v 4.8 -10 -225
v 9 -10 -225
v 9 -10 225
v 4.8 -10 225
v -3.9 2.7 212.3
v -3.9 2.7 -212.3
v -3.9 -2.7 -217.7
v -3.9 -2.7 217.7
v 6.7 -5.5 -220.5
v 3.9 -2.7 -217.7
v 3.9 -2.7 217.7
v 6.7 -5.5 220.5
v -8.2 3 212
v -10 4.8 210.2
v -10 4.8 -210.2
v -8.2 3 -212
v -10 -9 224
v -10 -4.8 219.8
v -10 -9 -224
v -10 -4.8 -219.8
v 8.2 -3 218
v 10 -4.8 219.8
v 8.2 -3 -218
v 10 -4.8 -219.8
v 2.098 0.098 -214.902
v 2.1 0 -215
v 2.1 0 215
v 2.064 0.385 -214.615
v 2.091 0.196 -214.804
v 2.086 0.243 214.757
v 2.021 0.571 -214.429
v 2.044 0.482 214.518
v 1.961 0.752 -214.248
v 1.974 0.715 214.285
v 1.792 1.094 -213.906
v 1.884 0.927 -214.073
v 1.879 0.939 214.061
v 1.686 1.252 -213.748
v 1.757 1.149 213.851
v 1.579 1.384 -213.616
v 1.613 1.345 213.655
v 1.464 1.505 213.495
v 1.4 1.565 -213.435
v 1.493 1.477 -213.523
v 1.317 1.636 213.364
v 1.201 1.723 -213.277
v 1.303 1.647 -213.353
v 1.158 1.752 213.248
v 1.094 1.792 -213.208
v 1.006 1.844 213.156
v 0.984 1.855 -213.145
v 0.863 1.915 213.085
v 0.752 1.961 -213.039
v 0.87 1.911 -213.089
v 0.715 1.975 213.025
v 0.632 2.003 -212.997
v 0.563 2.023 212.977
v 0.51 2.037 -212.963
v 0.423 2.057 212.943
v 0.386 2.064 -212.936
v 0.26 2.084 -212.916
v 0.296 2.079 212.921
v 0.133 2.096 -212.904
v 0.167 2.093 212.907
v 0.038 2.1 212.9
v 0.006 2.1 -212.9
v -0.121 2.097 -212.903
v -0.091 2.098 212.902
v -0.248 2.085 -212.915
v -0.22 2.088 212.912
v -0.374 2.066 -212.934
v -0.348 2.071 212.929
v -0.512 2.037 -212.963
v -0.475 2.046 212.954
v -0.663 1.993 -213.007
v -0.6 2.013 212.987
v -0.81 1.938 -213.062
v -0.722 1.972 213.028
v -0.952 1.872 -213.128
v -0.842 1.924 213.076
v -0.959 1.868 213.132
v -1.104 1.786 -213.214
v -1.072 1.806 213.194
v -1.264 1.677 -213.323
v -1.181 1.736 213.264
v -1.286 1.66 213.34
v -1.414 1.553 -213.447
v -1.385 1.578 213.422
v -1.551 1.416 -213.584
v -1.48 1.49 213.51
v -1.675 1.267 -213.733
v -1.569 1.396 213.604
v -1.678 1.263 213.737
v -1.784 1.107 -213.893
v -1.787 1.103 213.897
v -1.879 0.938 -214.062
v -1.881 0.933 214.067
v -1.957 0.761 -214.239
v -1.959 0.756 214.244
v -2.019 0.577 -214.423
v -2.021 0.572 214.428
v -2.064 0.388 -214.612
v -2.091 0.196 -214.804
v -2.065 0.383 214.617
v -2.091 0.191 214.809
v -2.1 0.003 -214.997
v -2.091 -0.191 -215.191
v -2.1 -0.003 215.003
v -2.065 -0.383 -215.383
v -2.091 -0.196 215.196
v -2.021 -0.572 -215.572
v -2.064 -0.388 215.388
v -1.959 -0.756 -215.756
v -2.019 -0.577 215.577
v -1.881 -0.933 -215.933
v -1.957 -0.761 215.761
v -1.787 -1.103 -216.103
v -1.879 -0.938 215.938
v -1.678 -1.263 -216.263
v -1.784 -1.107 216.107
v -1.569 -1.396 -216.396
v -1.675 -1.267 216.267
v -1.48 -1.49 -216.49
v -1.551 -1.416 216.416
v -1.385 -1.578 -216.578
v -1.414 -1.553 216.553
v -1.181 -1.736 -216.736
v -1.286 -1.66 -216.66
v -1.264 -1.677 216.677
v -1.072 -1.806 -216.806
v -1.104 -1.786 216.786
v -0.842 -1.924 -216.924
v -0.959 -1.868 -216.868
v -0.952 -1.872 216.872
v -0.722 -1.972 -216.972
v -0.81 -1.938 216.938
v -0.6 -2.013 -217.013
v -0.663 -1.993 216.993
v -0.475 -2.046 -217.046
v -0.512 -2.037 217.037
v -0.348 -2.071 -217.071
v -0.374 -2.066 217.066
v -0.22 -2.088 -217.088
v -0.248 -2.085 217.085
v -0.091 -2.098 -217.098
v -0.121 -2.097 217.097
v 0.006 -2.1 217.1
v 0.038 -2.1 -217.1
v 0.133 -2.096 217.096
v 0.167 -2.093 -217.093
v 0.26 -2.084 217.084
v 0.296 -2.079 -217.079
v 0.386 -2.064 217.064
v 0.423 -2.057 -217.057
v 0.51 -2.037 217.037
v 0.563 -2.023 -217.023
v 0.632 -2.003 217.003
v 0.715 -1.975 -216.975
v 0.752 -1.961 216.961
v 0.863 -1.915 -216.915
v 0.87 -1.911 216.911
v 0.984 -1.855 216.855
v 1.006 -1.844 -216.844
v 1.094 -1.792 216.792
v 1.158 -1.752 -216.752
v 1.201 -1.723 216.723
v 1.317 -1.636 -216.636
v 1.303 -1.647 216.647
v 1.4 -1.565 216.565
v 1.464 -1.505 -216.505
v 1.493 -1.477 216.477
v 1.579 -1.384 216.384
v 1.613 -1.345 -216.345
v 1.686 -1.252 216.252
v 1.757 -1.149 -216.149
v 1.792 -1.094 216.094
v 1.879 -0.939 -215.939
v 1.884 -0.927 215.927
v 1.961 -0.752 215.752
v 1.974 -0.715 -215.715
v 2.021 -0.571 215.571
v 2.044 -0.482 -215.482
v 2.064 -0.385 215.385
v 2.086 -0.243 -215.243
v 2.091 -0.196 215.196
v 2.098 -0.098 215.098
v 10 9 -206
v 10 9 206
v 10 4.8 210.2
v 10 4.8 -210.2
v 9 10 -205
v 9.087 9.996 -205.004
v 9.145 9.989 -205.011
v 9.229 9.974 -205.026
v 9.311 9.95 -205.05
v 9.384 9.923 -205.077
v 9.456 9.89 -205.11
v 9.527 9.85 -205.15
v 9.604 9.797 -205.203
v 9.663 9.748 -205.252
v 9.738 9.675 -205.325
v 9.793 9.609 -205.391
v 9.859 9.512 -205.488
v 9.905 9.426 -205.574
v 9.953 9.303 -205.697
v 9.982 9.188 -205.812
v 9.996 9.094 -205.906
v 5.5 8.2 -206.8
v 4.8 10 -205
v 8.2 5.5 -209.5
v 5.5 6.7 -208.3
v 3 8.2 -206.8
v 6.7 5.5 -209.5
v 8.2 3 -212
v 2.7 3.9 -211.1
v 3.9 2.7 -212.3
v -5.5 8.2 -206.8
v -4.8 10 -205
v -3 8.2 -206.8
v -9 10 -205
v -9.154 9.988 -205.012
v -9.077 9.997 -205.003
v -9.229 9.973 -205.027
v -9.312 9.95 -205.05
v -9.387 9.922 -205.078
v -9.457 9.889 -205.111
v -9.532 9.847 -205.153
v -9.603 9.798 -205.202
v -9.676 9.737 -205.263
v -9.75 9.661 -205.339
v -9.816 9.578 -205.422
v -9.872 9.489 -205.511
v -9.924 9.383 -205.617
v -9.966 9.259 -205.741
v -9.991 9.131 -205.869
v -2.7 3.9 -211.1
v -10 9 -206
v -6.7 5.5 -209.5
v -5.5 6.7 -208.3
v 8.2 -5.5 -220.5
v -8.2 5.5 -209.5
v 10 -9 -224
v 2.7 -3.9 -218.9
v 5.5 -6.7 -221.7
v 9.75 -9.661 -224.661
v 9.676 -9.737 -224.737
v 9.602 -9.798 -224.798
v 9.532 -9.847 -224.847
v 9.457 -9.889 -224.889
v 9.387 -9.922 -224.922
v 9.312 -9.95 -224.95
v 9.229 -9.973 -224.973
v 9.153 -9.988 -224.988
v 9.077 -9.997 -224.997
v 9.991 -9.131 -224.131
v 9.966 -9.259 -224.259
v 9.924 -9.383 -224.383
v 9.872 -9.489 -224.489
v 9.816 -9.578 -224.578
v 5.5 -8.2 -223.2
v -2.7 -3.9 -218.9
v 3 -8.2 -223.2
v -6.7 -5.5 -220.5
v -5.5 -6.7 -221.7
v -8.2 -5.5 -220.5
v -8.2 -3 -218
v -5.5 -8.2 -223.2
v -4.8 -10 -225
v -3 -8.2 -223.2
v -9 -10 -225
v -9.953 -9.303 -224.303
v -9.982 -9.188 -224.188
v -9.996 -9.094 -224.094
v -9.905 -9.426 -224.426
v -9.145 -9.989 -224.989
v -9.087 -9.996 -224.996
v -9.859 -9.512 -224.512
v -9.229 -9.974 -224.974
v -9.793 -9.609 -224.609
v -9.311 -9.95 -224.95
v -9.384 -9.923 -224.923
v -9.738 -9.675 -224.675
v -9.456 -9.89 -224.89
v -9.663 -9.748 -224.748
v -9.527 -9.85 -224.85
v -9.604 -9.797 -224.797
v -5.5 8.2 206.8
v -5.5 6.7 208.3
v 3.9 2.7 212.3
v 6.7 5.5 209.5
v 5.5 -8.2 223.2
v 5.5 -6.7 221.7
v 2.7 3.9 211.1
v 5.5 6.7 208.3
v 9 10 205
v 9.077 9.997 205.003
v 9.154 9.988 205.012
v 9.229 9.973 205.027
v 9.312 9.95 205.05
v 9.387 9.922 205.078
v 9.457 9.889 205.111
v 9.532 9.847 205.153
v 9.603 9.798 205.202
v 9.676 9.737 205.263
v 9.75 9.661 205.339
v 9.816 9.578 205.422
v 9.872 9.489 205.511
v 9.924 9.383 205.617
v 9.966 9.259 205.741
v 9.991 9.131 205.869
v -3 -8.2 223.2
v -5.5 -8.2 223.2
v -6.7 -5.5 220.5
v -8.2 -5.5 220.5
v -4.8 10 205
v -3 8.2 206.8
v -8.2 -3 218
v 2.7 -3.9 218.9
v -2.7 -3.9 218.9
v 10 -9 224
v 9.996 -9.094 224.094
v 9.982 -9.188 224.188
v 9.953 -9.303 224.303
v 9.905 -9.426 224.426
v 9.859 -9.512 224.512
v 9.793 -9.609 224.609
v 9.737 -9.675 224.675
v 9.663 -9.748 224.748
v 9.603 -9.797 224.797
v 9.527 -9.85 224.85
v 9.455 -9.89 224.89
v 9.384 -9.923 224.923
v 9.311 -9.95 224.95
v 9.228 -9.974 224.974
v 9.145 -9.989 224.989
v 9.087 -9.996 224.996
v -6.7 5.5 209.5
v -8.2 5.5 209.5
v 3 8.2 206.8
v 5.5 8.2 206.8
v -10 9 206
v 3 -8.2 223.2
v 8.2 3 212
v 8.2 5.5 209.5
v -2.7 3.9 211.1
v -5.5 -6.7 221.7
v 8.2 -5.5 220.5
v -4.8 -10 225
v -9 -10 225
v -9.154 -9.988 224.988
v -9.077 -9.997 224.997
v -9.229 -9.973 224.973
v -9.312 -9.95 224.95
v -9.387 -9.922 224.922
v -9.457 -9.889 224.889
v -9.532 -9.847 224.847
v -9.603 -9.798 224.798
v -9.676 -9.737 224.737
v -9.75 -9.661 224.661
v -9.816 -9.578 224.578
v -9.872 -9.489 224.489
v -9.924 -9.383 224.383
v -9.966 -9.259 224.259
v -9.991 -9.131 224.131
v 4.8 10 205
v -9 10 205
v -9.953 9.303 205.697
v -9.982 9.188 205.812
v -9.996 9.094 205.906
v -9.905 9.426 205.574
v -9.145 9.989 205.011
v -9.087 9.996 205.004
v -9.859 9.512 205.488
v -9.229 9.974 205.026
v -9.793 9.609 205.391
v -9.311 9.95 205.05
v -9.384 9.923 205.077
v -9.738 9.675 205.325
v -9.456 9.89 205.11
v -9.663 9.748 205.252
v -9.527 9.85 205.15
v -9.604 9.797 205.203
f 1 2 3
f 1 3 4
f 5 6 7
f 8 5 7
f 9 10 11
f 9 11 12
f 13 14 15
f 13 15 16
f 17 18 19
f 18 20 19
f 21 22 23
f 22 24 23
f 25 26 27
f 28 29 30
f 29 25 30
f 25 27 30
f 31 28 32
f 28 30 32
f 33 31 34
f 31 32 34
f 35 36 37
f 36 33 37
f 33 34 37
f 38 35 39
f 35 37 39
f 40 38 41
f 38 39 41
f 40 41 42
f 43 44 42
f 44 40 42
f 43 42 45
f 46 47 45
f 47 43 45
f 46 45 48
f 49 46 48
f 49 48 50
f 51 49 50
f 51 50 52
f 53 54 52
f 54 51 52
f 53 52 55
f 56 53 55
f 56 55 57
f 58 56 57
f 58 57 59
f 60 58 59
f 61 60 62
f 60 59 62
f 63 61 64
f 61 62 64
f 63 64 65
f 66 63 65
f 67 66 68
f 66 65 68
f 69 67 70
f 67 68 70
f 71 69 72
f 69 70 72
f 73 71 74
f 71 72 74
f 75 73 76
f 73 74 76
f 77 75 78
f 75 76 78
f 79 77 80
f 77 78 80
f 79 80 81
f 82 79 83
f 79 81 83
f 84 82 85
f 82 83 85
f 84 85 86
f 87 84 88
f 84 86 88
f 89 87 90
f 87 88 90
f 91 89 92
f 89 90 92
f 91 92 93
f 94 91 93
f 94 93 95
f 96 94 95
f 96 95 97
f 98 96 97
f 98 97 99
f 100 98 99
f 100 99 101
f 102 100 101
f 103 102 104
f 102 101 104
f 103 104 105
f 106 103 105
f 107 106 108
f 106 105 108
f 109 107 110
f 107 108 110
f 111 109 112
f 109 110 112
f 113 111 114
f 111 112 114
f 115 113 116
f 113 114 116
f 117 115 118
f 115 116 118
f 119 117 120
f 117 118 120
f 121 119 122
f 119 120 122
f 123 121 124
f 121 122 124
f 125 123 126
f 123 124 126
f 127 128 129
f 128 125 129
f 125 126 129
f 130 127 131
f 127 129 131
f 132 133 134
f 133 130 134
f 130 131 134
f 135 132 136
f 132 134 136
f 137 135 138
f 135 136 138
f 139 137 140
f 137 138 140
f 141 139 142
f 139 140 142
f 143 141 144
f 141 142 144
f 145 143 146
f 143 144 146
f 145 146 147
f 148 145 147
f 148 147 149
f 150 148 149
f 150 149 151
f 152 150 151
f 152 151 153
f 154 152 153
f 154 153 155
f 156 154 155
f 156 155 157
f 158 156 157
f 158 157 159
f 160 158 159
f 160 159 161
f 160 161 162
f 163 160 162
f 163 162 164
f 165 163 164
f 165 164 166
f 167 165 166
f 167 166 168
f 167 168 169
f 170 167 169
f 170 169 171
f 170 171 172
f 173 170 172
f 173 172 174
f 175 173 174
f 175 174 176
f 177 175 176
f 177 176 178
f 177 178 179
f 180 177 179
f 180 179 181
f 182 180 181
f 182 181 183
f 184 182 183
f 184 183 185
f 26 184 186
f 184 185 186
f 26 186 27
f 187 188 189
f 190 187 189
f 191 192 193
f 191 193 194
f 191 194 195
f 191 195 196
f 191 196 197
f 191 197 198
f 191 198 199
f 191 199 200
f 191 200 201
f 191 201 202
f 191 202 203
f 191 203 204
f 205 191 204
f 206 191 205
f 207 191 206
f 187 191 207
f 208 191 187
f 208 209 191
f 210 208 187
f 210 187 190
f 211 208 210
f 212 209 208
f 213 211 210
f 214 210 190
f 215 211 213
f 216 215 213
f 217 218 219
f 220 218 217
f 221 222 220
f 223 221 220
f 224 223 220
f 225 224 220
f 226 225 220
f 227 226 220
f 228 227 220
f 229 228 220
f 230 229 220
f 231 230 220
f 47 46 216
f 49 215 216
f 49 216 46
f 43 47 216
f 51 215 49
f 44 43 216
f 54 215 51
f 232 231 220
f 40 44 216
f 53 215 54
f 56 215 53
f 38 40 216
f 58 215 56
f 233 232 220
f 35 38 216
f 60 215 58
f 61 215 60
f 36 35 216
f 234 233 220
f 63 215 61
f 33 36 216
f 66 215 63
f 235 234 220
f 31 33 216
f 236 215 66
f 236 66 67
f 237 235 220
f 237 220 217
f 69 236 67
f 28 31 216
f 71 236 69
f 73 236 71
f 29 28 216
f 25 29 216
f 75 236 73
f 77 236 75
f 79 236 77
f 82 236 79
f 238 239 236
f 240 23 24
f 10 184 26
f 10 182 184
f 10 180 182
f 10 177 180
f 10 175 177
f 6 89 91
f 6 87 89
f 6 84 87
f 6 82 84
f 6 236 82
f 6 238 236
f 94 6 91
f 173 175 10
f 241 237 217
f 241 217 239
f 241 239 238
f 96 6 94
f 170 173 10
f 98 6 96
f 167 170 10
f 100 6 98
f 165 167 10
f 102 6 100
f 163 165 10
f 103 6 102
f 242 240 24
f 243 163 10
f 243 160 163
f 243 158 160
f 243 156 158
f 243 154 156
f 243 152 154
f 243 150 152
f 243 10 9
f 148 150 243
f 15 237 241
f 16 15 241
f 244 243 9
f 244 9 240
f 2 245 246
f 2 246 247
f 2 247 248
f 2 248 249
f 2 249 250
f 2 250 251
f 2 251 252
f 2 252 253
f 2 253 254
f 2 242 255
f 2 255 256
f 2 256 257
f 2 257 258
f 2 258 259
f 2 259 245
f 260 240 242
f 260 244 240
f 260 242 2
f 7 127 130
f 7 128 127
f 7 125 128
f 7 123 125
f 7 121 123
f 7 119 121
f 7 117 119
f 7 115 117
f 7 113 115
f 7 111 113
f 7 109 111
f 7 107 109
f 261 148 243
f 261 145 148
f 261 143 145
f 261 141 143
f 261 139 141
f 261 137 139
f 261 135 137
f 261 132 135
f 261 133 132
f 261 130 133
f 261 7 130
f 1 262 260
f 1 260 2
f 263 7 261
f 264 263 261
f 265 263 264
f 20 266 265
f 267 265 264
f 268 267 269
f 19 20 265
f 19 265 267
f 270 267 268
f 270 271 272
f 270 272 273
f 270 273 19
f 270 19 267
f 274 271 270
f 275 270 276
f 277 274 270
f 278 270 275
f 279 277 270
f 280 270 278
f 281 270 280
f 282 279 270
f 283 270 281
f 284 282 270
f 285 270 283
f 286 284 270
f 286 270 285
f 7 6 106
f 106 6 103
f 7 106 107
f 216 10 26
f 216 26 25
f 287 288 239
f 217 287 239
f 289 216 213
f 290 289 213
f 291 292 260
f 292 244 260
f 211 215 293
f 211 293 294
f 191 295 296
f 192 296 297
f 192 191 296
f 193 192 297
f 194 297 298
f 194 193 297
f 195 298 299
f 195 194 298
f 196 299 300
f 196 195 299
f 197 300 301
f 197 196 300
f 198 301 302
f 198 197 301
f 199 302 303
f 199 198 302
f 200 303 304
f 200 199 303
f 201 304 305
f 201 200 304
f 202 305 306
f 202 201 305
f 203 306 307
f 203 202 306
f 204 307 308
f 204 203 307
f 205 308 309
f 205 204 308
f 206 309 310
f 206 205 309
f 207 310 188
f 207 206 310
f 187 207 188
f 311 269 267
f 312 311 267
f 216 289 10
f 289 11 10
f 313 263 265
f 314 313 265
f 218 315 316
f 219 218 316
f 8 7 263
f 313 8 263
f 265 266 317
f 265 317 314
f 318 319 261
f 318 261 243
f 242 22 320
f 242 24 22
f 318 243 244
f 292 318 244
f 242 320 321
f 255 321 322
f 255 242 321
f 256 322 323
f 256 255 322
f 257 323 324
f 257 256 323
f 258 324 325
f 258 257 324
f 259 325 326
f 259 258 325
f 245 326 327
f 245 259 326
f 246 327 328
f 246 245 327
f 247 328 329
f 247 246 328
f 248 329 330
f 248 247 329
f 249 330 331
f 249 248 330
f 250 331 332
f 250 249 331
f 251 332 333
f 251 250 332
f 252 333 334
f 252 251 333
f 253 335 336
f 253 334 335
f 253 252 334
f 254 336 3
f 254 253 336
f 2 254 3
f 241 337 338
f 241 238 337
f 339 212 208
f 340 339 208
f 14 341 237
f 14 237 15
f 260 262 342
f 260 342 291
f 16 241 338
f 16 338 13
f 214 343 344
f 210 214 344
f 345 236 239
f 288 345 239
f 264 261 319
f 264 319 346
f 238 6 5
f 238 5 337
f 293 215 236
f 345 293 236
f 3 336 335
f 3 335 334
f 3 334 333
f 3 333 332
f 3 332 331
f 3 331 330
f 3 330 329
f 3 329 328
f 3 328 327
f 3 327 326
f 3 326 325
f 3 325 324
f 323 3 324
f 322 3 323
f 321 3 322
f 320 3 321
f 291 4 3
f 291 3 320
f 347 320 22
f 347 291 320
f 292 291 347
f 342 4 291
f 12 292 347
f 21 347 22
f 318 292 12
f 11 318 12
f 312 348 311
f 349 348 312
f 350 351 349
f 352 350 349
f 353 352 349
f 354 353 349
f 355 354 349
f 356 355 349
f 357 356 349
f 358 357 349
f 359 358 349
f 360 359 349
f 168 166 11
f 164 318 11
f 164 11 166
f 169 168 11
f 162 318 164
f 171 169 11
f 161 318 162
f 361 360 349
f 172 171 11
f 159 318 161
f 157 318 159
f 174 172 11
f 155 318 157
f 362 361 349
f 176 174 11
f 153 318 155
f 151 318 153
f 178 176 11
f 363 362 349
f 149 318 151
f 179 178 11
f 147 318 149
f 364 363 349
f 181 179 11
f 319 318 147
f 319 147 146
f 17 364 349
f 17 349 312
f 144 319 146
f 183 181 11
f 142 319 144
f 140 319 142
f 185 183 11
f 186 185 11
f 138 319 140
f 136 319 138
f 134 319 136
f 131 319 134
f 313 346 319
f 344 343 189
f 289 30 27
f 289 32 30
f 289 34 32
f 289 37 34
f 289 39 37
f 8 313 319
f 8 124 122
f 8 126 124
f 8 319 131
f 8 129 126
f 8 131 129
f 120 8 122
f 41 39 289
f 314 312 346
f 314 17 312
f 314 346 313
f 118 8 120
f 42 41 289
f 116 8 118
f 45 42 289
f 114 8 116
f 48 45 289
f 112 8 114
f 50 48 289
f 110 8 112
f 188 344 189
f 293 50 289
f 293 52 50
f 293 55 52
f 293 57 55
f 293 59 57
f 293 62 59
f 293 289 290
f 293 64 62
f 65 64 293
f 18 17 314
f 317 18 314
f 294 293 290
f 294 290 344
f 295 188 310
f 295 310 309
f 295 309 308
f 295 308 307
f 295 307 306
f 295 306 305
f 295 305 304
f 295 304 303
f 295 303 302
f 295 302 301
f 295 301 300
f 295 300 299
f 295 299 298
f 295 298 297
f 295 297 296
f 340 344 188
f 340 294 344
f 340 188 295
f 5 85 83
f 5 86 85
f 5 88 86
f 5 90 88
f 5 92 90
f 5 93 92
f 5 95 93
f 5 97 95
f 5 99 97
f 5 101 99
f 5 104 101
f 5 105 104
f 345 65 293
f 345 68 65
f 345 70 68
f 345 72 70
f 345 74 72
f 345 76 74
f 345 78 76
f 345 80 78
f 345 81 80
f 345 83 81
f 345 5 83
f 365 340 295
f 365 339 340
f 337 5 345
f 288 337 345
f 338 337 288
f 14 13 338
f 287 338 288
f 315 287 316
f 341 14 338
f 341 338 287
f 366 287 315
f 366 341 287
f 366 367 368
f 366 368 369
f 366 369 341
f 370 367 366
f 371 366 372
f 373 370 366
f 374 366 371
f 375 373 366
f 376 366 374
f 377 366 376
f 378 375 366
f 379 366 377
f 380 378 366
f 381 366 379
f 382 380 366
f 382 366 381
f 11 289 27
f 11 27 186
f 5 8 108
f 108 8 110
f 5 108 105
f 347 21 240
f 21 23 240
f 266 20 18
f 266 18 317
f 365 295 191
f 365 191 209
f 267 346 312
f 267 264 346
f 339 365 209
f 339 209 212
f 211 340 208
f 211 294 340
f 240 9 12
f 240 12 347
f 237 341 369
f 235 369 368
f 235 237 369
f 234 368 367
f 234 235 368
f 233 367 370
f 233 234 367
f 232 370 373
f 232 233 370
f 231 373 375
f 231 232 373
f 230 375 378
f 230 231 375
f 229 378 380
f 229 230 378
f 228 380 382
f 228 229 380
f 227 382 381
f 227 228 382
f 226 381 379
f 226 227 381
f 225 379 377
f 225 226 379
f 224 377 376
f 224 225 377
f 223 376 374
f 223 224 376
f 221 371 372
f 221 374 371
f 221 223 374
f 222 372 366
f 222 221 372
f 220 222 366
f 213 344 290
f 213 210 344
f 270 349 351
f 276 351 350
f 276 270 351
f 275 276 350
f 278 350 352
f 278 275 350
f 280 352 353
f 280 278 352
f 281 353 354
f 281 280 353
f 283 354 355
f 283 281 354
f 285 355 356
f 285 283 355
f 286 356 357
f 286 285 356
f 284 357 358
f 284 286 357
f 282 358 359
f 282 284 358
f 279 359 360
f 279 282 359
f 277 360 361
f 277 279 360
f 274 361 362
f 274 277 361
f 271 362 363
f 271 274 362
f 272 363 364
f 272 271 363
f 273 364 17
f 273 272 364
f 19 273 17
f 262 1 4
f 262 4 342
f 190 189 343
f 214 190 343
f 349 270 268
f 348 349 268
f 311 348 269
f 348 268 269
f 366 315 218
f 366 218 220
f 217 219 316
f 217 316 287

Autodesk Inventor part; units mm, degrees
ref_plane "YZ Plane" through (0, 0, 0) normal (1, 0, 0) x (0, 1, 0)
sketch "Эскиз1" plane through (0, 0, 0) normal (0, 0, 1) x (1, 0, 0)
  line L0 (-4.8, 10) -> (-3, 8.2)
  line L1 (-4.8, 10) -> (-2.2544, 10) construction
  line L2 (4.8, 10) -> (3, 8.2)
  line L3 (4.8, 10) -> (7.3456, 10) construction
  line L4 (10, 4.8) -> (8.2, 3)
  arc A0 (-9, 10) -> (-10, 9) centre (-9, 9) ccw
  arc A1 (10, 9) -> (9, 10) centre (9, 9) ccw
  arc A2 (-10, -9) -> (-9, -10) centre (-9, -9) ccw
  arc A3 (8.9996, -10) -> (10, -9) centre (9, -9) ccw
  line L5 (0, 3.9) -> (-2.7, 3.9)
  line L6 (0, 3.9) -> (2.7, 3.9)
  line L7 (3, 8.2) -> (5.5, 8.2)
  line L8 (2.7, 3.9) -> (5.5, 6.7)
  line L9 (5.5, 6.7) -> (5.5, 8.2)
  line L10 (3.9, 0) -> (3.9, 2.7)
  line L11 (3.9, 0) -> (3.9, -2.7)
  line L12 (3.9, 2.7) -> (6.7, 5.5)
  line L13 (3.9, 2.7) -> (7.8598, 2.7) construction
  line L14 (9, 10) -> (4.8, 10)
  line L15 (-4.8, 10) -> (-9, 10)
  line L16 (0, -3.9) -> (-2.7, -3.9)
  line L17 (0, -3.9) -> (2.7, -3.9)
  line L18 (-3.9, 0) -> (-3.9, -2.7)
  line L19 (-3.9, 0) -> (-3.9, 2.7)
  line L20 (8.2, 3) -> (8.2, 5.5)
  line L21 (8.2, 5.5) -> (6.7, 5.5)
  line L22 (-10, -4.8) -> (-7.4544, -4.8) construction
  line L23 (-4.8, -10) -> (-3, -8.2)
  line L24 (-4.8, -10) -> (-2.2544, -10) construction
  line L25 (4.7996, -10) -> (2.9996, -8.2)
  line L26 (4.7996, -10) -> (7.3452, -10) construction
  line L27 (10, -4.8) -> (8.2, -3)
  line L28 (8.9996, -10) -> (4.7996, -10)
  line L29 (-9, -10) -> (-4.8, -10)
  line L30 (10, -4.8) -> (10, -9)
  line L31 (10, 9) -> (10, 4.8)
  line L32 (-10, -4.8) -> (-10, -9)
  line L33 (-3, 8.2) -> (-5.5, 8.2)
  line L34 (-2.7, 3.9) -> (-5.5, 6.7)
  line L35 (-2.7, 3.9) -> (1.2598, 3.9) construction
  line L36 (-5.5, 6.7) -> (-5.5, 8.2)
  line L37 (-3.9, 2.7) -> (-6.7, 5.5)
  line L38 (-6.7, 5.5) -> (-8.2, 5.5)
  line L39 (-8.2, -3) -> (-8.2, -5.5)
  line L40 (-3, -8.2) -> (-5.5, -8.2)
  line L41 (2.9996, -8.2) -> (5.5, -8.2)
  line L42 (8.2, -3) -> (8.2, -5.5)
  line L43 (-3.9, -2.7) -> (-6.7, -5.5)
  line L44 (-6.7, -5.5) -> (-8.2, -5.5)
  line L45 (-2.7, -3.9) -> (-5.5, -6.7)
  line L46 (-5.5, -6.7) -> (-5.5, -8.2)
  line L47 (-10, 9) -> (-10, 4.8)
  line L48 (-10, 4.8) -> (-8.2, 3)
  line L49 (-8.2, 5.5) -> (-8.2, 3)
  line L50 (-10, -4.8) -> (-8.2, -3)
  line L51 (2.7, -3.9) -> (5.5, -6.7)
  line L52 (5.5, -6.7) -> (5.5, -8.2)
  line L53 (3.9, -2.7) -> (6.7, -5.5)
  line L54 (6.7, -5.5) -> (8.2, -5.5)
  point P0 (0, 0)
  dimension "d16" = 45
  dimension "d17" = 135
  dimension "d25" = 6
  dimension "d29" = 1
  dimension "d30" = 1
  dimension "d31" = 2.7
  dimension "d32" = 2.7
  dimension "d34" = 2.5
  dimension "d36" = 2.7
  dimension "d37" = 2.7
  dimension "d38" = 3.9
  dimension "d39" = 45
  dimension "d42" = 2.7
  dimension "d43" = 2.7
  dimension "d44" = 3.9
  dimension "d45" = 2.7
  dimension "d46" = 2.7
  dimension "d48" = 10
  dimension "d49" = 10
  dimension "d55" = 4.5
  dimension "d58" = 9
  dimension "d59" = 9
  dimension "d60" = 2.5
  dimension "d61" = 2.8
  dimension "d63" = 1.6971
  dimension "d65" = 45
  dimension "d67" = 135
  dimension "d73" = 10
  dimension "d74" = 10
  dimension "d77" = 18
  dimension "d78" = 18
  dimension "d79" = 135
  dimension "d80" = 135
  dimension "d81" = 4.5
  dimension "d82" = 1.8
  dimension "d83" = 1.8
  dimension "d84" = 1
  dimension "d85" = 1
  dimension "d87" = 4.5
  dimension "d89" = 1.8
  dimension "d91" = 135
  dimension "d92" = 1.6971
  dimension "d94" = 4.5
  dimension "d95" = 1.8
  dimension "d96" = 4.5
  dimension "d97" = 1.8
  dimension "d98" = 4.5
  dimension "d99" = 1.8
  dimension "d100" = 1.8
  dimension "d107" = 4.2
  dimension "d108" = 10
  dimension "d109" = 4.5
  dimension "d110" = 1.8
  dimension "d111" = 135
  dimension "d112" = 4.2
  dimension "d113" = 4.2
  dimension "d114" = 6
  dimension "d115" = 135
  dimension "d116" = 1.6971
  dimension "d117" = 4.2
  dimension "d118" = 4.2
  dimension "d119" = 4.5
  dimension "d120" = 135
  dimension "d121" = 1.5
extrude "Выдавливание2" add sketch "Эскиз1" along normal mid plane 450
sketch "Эскиз2" plane through (0, 0, 225) normal (0, 0, 1) x (1, 0, 0)
  circle A0 centre (0, 0) radius 2.1
  dimension "d131" = 4.2
extrude "Выдавливание3" cut sketch "Эскиз2" against normal through all
sketch "Эскиз3" plane through (10, 9, 225) normal (1, 0, 0) x (0, 0, -1)
  line L0 (0, -17.2) -> (0, -19) projected
  line L1 (0, -19) -> (17.7821, -1.2179)
  line L2 (0, -19) -> (25.1477, -19) construction
  point P0 (225, -9)
  dimension "d134" = 45
ref_plane "РабПлоскость1" through (10, -10, 225) normal (0, -0.7071, -0.7071) x (0, 0.7071, -0.7071)
sketch "Эскиз4" plane through (10, -4.8, 225) normal (1, 0, 0) x (0, 0, -1)
  line L0 (450, -5.2) -> (0, -5.2) projected
  line L1 (450, -5.2) -> (430, 14.8)
  line L2 (450, 14.8) -> (0, 14.8) projected
  line L3 (450, -5.2) -> (478.2843, -5.2) construction
  point P0 (225, 4.8)
  dimension "d136" = 135
ref_plane "РабПлоскость2" through (10, -10, -225) normal (0, -0.7071, 0.7071) x (0, 0.7071, 0.7071)
split "Разделение1" plane through (10, -10, 225) removes the side toward (0, 0.7071, 0.7071)
split "Разделение2" plane through (10, -10, -225) removes the side toward (0, 0.7071, -0.7071)
properties part number "Профиль_аллюминиевый450_45"
